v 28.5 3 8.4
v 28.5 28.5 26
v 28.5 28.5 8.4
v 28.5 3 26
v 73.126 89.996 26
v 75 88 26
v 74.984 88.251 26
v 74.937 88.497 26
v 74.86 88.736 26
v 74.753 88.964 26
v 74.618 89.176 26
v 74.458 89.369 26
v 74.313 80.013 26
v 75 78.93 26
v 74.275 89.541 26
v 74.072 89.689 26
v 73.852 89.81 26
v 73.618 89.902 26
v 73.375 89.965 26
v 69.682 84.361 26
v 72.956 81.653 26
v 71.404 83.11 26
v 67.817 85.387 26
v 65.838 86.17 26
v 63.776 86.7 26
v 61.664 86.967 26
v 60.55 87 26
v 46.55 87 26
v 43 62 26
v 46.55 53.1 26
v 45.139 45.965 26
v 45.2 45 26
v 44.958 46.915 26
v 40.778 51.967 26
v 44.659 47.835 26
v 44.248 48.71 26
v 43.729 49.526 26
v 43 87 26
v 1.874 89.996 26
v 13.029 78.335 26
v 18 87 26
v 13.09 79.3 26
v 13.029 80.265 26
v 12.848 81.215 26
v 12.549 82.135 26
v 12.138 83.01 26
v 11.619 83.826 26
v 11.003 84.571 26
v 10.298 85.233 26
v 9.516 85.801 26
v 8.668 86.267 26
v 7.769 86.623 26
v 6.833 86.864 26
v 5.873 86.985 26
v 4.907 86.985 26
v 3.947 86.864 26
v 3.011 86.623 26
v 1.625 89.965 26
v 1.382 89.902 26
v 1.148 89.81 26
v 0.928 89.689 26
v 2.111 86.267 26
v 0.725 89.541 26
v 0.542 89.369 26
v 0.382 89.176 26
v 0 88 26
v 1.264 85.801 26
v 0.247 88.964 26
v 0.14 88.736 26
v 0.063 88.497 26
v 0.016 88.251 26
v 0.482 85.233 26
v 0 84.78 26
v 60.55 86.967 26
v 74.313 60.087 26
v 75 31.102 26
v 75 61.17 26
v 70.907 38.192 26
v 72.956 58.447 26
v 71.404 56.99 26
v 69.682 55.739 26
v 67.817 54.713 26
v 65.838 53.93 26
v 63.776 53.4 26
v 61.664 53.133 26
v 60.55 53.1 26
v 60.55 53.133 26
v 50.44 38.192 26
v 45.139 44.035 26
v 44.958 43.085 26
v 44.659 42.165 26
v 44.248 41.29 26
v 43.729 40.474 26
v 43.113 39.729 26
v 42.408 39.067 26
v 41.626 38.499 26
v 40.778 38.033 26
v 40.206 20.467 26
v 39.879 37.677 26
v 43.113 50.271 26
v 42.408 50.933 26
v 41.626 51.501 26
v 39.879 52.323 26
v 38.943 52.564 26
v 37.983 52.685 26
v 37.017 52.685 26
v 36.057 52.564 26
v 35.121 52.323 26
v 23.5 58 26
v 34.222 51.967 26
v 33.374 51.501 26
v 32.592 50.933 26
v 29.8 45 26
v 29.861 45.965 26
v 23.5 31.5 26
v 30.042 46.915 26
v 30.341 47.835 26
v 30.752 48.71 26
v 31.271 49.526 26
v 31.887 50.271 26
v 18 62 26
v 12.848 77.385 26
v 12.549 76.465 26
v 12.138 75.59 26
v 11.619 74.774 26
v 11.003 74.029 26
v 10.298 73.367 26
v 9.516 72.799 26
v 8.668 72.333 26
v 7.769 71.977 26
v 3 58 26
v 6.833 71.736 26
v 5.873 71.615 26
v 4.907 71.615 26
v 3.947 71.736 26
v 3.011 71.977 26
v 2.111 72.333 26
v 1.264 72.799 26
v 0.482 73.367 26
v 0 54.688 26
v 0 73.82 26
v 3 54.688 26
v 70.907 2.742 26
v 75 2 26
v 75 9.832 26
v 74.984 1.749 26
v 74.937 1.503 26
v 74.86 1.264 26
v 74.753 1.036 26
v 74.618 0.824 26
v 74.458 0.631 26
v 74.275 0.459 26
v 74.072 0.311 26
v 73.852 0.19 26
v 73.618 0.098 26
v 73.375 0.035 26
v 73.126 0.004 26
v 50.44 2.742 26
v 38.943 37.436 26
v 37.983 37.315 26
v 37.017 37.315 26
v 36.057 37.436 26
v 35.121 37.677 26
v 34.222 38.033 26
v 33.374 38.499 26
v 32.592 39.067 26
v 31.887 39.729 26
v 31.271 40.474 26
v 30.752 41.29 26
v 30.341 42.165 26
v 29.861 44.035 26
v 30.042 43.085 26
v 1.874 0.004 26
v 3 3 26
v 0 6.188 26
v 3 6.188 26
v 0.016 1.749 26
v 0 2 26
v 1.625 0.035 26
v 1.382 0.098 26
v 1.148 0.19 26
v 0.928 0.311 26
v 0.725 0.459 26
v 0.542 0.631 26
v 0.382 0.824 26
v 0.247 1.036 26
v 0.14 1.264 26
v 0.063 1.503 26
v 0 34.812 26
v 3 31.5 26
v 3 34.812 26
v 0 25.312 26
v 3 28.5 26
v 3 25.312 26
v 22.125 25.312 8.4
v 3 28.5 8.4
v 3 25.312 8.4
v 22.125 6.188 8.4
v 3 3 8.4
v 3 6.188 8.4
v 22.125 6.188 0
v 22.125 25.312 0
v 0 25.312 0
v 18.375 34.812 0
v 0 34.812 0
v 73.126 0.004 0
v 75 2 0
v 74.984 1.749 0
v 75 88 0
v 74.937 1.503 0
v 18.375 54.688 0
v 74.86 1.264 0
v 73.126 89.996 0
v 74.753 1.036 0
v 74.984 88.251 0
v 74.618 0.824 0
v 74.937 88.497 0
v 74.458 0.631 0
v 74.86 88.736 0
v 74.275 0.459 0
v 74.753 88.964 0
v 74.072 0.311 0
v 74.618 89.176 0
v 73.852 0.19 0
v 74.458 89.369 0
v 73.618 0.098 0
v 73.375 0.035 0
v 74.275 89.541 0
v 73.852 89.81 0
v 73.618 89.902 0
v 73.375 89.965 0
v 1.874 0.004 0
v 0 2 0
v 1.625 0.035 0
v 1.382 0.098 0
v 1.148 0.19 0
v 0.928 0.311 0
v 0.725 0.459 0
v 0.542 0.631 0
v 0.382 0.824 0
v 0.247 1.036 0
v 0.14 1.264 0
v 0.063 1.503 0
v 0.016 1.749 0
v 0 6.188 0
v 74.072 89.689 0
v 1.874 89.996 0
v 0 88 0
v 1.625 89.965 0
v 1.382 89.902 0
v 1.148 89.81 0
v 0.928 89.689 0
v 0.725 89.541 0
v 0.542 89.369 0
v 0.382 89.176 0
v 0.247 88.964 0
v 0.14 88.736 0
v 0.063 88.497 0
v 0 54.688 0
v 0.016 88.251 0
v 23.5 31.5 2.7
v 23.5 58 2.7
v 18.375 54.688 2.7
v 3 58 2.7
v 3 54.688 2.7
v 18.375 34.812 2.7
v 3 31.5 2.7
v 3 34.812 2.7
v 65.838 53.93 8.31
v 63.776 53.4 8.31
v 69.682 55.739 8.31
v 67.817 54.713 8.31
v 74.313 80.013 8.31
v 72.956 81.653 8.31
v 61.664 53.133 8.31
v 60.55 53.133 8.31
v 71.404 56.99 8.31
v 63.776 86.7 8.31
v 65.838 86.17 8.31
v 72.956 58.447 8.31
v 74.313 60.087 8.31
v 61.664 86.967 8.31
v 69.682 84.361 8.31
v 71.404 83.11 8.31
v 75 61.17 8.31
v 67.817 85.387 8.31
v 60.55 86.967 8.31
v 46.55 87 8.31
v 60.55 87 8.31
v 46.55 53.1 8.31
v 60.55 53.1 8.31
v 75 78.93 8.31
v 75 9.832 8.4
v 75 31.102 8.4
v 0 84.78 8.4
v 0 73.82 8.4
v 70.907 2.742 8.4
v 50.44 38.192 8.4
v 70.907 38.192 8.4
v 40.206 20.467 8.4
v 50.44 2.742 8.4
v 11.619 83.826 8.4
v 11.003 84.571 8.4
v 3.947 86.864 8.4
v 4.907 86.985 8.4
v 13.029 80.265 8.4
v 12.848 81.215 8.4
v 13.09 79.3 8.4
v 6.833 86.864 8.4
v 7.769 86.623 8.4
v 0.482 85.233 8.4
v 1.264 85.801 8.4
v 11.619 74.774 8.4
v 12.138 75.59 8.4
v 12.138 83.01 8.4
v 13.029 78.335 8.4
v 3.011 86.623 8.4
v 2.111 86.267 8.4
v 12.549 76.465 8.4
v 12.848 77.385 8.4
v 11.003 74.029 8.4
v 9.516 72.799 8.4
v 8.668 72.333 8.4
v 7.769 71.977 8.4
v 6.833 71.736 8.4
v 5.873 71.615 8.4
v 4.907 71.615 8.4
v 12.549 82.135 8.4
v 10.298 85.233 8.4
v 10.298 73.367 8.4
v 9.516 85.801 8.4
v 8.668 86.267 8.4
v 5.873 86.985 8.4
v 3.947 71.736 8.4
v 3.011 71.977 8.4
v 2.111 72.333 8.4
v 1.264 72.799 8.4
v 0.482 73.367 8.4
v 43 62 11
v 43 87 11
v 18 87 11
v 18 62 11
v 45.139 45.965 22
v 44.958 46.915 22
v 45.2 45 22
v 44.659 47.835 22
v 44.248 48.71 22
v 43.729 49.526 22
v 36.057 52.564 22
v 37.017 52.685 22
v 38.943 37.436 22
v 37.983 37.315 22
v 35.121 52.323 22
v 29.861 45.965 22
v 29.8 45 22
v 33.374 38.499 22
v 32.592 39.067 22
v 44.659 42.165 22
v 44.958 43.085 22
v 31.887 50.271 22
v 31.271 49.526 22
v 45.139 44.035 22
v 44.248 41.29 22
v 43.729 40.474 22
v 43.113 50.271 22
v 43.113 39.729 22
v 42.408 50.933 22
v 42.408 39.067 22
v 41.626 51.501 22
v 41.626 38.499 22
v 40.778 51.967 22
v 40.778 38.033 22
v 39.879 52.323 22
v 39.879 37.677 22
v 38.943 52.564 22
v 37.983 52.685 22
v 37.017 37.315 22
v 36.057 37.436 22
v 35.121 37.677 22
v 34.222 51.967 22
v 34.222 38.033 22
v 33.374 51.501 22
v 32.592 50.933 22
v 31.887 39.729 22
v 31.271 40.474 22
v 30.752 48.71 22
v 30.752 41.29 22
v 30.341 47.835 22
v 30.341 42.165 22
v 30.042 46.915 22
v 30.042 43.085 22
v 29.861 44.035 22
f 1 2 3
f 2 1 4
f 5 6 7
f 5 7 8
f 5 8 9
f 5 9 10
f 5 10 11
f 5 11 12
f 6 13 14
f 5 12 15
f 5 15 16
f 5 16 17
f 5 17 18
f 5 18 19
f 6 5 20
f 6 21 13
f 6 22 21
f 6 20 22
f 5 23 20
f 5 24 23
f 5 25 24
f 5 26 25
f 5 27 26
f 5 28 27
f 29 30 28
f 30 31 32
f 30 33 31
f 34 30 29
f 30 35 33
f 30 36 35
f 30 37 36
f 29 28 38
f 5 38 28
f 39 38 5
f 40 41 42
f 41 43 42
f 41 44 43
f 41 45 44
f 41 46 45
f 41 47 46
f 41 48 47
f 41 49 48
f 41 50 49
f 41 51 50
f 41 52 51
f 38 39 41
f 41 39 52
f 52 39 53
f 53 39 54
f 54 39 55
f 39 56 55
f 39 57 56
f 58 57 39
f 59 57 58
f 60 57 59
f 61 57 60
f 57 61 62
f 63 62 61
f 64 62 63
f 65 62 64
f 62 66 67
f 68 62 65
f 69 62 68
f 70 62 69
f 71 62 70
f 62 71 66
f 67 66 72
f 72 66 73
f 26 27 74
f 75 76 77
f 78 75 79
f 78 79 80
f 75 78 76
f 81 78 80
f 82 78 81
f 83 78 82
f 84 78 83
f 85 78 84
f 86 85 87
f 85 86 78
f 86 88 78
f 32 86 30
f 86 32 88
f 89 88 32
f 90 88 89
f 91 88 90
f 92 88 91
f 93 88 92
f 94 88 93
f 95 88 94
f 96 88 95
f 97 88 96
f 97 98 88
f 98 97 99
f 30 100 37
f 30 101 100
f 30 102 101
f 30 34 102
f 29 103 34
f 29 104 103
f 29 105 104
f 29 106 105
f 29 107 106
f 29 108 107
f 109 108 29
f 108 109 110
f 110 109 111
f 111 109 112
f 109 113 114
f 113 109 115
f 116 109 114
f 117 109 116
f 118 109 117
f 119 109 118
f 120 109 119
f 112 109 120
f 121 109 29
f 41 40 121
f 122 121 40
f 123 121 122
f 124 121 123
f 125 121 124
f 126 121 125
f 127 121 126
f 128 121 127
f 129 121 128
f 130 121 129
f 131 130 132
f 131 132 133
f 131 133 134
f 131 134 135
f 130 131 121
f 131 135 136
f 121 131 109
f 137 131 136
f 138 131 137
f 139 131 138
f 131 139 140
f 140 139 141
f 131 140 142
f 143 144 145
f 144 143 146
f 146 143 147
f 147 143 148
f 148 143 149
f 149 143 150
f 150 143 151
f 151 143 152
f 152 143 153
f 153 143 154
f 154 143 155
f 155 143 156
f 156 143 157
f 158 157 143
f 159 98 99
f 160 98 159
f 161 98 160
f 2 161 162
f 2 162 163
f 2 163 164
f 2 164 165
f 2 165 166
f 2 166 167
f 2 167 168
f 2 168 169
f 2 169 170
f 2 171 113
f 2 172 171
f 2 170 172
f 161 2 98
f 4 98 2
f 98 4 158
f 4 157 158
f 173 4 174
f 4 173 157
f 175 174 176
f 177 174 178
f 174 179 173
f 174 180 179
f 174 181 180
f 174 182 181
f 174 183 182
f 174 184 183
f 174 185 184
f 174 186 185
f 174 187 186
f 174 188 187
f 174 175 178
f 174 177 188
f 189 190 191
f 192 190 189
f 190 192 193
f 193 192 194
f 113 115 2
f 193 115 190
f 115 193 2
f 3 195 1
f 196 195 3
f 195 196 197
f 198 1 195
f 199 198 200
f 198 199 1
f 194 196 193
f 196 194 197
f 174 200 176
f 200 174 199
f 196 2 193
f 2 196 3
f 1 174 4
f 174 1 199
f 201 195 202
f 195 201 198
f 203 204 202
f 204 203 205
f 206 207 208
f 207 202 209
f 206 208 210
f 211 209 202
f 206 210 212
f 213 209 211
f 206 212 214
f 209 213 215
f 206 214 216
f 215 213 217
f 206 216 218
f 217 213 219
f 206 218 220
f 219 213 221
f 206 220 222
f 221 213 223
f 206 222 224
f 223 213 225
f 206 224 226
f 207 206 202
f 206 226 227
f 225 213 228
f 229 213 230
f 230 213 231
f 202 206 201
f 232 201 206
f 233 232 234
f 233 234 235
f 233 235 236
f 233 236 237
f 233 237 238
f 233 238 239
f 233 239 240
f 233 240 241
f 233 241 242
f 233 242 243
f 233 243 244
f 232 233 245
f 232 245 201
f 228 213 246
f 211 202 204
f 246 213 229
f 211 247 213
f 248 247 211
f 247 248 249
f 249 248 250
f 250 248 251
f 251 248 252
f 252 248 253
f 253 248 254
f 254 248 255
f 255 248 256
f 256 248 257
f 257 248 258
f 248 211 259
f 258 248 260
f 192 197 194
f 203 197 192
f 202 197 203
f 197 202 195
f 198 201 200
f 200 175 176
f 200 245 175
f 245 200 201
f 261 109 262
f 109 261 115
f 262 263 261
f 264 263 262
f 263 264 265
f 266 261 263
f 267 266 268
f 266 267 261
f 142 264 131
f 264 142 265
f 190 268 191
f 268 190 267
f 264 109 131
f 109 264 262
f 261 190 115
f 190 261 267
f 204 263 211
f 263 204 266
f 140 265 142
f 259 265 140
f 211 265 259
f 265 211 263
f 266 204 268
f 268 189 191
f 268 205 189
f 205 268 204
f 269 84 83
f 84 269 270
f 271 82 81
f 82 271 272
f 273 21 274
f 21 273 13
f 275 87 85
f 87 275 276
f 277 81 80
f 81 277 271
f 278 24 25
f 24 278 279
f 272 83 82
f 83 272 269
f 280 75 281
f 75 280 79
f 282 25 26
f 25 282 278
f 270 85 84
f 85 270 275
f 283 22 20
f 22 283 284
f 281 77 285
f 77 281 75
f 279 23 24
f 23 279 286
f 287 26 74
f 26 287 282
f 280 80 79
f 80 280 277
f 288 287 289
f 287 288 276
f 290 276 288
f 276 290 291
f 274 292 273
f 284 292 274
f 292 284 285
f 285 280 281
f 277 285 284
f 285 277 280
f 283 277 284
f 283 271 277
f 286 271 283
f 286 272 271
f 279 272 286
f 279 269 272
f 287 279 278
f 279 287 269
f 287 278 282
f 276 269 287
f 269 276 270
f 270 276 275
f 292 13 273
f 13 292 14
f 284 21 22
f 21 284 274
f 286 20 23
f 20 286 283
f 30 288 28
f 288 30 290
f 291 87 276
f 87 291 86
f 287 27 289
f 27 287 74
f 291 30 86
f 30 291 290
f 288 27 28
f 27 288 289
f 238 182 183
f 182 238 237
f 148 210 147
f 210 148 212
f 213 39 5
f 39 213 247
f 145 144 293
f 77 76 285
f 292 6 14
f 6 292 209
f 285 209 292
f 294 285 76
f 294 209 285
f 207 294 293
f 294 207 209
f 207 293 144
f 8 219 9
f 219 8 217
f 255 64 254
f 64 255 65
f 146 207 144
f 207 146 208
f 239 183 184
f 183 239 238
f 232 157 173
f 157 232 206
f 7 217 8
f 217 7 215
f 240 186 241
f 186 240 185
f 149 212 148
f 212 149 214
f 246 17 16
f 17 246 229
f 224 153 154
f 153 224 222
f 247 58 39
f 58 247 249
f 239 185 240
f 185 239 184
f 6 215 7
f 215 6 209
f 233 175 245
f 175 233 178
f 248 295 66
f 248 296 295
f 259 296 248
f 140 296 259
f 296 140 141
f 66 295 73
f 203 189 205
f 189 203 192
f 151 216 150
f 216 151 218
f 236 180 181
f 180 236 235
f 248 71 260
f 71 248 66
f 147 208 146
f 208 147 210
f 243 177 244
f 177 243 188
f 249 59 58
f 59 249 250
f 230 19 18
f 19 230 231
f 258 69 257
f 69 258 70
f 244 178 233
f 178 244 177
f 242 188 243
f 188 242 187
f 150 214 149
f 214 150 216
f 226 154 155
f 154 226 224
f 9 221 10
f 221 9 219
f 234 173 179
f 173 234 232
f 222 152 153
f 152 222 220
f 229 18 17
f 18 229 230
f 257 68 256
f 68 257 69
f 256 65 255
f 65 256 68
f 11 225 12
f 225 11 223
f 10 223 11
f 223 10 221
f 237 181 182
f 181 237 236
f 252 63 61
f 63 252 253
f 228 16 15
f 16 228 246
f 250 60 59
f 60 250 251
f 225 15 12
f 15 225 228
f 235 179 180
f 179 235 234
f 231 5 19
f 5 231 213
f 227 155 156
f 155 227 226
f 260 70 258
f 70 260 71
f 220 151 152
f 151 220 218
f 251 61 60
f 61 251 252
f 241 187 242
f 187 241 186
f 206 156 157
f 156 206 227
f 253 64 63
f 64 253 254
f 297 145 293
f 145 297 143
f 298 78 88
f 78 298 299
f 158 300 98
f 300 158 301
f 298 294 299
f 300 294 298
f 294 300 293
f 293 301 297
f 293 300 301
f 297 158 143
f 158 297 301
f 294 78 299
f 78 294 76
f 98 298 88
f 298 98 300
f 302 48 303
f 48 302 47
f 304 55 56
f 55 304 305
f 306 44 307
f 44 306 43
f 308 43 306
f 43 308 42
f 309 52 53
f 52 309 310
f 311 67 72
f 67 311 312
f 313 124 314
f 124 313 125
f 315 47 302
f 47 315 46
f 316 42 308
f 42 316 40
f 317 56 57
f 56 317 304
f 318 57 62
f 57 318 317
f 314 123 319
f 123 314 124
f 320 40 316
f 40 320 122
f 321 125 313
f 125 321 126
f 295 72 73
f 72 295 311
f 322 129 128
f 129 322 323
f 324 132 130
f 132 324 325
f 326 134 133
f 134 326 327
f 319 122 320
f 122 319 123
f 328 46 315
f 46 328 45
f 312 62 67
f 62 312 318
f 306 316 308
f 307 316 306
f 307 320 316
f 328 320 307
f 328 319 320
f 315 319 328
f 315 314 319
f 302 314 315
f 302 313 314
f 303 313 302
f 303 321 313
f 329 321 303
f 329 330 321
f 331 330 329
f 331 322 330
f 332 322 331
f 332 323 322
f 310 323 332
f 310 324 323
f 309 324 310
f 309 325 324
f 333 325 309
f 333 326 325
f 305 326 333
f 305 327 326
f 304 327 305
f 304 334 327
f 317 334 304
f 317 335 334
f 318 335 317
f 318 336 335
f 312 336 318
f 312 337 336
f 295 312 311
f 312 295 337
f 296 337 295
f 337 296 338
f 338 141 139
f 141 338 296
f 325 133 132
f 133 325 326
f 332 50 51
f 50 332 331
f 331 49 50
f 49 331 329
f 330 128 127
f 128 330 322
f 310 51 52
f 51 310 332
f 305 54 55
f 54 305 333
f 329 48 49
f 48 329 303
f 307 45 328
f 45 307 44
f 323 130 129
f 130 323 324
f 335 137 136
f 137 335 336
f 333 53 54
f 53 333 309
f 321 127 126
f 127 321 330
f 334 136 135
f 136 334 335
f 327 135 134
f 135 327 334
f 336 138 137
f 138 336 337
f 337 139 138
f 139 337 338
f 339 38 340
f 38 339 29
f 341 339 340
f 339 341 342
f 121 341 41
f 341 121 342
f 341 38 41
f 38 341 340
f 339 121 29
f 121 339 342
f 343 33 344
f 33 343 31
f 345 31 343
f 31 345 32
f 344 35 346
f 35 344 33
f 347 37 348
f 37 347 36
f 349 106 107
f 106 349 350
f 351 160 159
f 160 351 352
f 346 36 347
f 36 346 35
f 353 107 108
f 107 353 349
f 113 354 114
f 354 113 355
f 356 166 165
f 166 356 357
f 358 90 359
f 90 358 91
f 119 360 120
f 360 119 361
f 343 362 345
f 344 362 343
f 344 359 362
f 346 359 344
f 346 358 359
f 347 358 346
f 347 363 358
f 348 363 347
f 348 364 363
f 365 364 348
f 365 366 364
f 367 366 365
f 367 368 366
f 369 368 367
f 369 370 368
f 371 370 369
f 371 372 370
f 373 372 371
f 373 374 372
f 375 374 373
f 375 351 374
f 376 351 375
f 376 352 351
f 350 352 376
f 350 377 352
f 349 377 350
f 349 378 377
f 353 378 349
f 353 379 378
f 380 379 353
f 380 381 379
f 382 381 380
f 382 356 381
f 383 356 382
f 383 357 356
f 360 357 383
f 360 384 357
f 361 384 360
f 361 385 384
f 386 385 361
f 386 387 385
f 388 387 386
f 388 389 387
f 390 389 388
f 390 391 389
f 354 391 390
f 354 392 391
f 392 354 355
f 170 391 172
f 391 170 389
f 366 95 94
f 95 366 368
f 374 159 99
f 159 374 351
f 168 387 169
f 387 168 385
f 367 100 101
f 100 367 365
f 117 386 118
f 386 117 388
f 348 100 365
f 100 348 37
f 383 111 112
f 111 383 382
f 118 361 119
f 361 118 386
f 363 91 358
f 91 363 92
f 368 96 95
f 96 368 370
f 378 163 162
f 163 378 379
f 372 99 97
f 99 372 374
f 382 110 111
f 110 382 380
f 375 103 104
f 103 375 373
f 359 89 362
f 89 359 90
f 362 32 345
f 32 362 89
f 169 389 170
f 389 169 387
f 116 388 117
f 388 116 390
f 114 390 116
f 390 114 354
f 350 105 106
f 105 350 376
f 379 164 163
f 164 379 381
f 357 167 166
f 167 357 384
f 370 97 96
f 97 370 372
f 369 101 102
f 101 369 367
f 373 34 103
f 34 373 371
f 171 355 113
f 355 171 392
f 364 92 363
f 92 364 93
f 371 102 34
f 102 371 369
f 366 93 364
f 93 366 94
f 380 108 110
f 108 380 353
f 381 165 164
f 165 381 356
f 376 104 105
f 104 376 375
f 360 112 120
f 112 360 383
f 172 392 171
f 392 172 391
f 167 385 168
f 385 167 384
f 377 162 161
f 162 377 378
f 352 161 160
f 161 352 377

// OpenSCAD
// file: SquareWithCirclePileLib.scad
module LeftPile(
    wallThickness,
    totalHeight,
    singlePileHeight,
    singlePileWidth,
    singlePileSquareLength,
    singlePileCircleLength,
    pileCount,
    openingSizePercent = .75
){
    pileHeight = (pileCount * singlePileHeight) + .5;
    offset = singlePileCircleLength * .15;

    translate([singlePileCircleLength - offset, wallThickness, totalHeight - pileHeight])
        cube([singlePileSquareLength, singlePileWidth, pileHeight]);
    union() {
        intersection(){
            translate([singlePileWidth/2 - offset, wallThickness + singlePileWidth/2, totalHeight - pileHeight])
                cylinder(pileHeight, d=singlePileWidth);
            translate([0, wallThickness, totalHeight - pileHeight])
                cube([singlePileCircleLength, singlePileWidth, pileHeight]);
        }
        intersection(){
            translate([singlePileWidth/2 - offset, wallThickness + singlePileWidth/2, totalHeight - pileHeight])
                cylinder(pileHeight, d=singlePileWidth);
            translate([-wallThickness, wallThickness, totalHeight - pileHeight])
                cube([singlePileCircleLength, singlePileWidth, pileHeight]);
        }
        translate([4, 4, 0])
            rotate([0, 0, 45])
                translate([wallThickness, wallThickness, totalHeight - pileHeight])
                    cube([singlePileCircleLength, singlePileCircleLength, pileHeight]);
    }
}

module RightPile(
    wallThickness,
    totalHeight,
    singlePileHeight,
    singlePileWidth,
    singlePileSquareLength,
    singlePileCircleLength,
    pileCount,
    openingSizePercent = .75
){
    translate([0, wallThickness + wallThickness + singlePileWidth, 0])
        rotate([0, 0, 180])
            LeftPile(
                wallThickness,
                totalHeight,
                singlePileHeight,
                singlePileWidth,
                singlePileSquareLength,
                singlePileCircleLength,
                pileCount,
                openingSizePercent
            );
}

module BottomPile(
    wallThickness,
    totalHeight,
    singlePileHeight,
    singlePileWidth,
    singlePileSquareLength,
    singlePileCircleLength,
    pileCount,
    openingSizePercent = .75
){
    translate([wallThickness + wallThickness + singlePileWidth, 0, 0])
        rotate([0, 0, 90])
            LeftPile(
                wallThickness,
                totalHeight,
                singlePileHeight,
                singlePileWidth,
                singlePileSquareLength,
                singlePileCircleLength,
                pileCount,
                openingSizePercent
            );
}

module TopPile(
    wallThickness,
    totalHeight,
    singlePileHeight,
    singlePileWidth,
    singlePileSquareLength,
    singlePileCircleLength,
    pileCount,
    openingSizePercent = .75
){
        rotate([0, 0, 270])
            LeftPile(
                wallThickness,
                totalHeight,
                singlePileHeight,
                singlePileWidth,
                singlePileSquareLength,
                singlePileCircleLength,
                pileCount,
                openingSizePercent
            );
}
// file: HexPileLib.scad
module LeftPile(totalHeight, singlePileHeight, singlePileDiameter, pileCount){
    pileHeight = (pileCount * singlePileHeight) + .5;
    offset = singlePileDiameter * .15;
    translate([singlePileDiameter/2 - offset, singlePileDiameter/2, totalHeight - pileHeight])
        cylinder(pileHeight, d=singlePileDiameter, $fn=6);
}

module RightPile(totalHeight, singlePileHeight, singlePileDiameter, pileCount){
    translate([0, singlePileDiameter, 0])
        rotate([0, 0, 180])
            LeftPile(totalHeight, singlePileHeight, singlePileDiameter, pileCount);
}

module BottomPile(totalHeight, singlePileHeight, singlePileDiameter, pileCount){
    translate([singlePileDiameter, 0, 0])
        rotate([0, 0, 90])
            LeftPile(totalHeight, singlePileHeight, singlePileDiameter, pileCount);
}

module TopPile(totalHeight, singlePileHeight, singlePileDiameter, pileCount){
        rotate([0, 0, 270])
            LeftPile(totalHeight, singlePileHeight, singlePileDiameter, pileCount);
}
// file: CaledoniaPointTileLib.scad
include<SquareWithCirclePileLib.scad>
singlePointTileHeight = 1.91;
singlePointTileWidth = 32.9 + 1;
singlePointTileSquareLength = 13 + 1;
singlePointTileCircleLength = 16 + 1;

module LeftPointTile(wallThickness, totalHeight, pointTileCount){
    LeftPile(
        wallThickness,
        totalHeight,
        singlePointTileHeight,
        singlePointTileWidth,
        singlePointTileSquareLength,
        singlePointTileCircleLength,
        pointTileCount);
}

module RightPointTile(wallThickness, totalHeight, pointTileCount){
    RightPile(
        wallThickness,
        totalHeight,
        singlePointTileHeight,
        singlePointTileWidth,
        singlePointTileSquareLength,
        singlePointTileCircleLength,
        pointTileCount);
}

module BottomPointTile(wallThickness, totalHeight, pointTileCount){
    BottomPile(
        wallThickness,
        totalHeight,
        singlePointTileHeight,
        singlePointTileWidth,
        singlePointTileSquareLength,
        singlePointTileCircleLength,
        pointTileCount);
}

module TopPointTile(wallThickness, totalHeight, pointTileCount){
    TopPile(
        wallThickness,
        totalHeight,
        singlePointTileHeight,
        singlePointTileWidth,
        singlePointTileSquareLength,
        singlePointTileCircleLength,
        pointTileCount);
}

function pointTileHeight(pointTileCount) =
    (pointTileCount * singlePointTileHeight) + .5;
// file: CirclePileLib.scad
module LeftPile(totalHeight, singlePileHeight, singlePileDiameter, pileCount){
    pileHeight = (pileCount * singlePileHeight) + .5;
    offset = singlePileDiameter * .15;
    translate([singlePileDiameter/2 - offset, singlePileDiameter/2, totalHeight - pileHeight])
        cylinder(pileHeight, d=singlePileDiameter);
}

module RightPile(totalHeight, singlePileHeight, singlePileDiameter, pileCount){
    translate([0, singlePileDiameter, 0])
        rotate([0, 0, 180])
            LeftPile(totalHeight, singlePileHeight, singlePileDiameter, pileCount);
}

module BottomPile(totalHeight, singlePileHeight, singlePileDiameter, pileCount){
    translate([singlePileDiameter, 0, 0])
        rotate([0, 0, 90])
            LeftPile(totalHeight, singlePileHeight, singlePileDiameter, pileCount);
}

module TopPile(totalHeight, singlePileHeight, singlePileDiameter, pileCount){
        rotate([0, 0, 270])
            LeftPile(totalHeight, singlePileHeight, singlePileDiameter, pileCount);
}
// file: CaledoniaPortsLib.scad
include<HexPileLib.scad>
singlePortHeight = 1.9;
//flat to flat = d = 34.65;
//D = d * 2/rt(3)
d = 34.65 + .8;
D = d * 2/sqrt(3);
singlePortDiameter = D;
//singlePortDiameter =  + .5;

module LeftPort(totalHeight, portCount){
    LeftPile(
        totalHeight,
        singlePortHeight,
        singlePortDiameter,
        portCount);
}

module RightPort(totalHeight, portCount){
    RightPile(
        totalHeight,
        singlePortHeight,
        singlePortDiameter,
        portCount);
}

module BottomPort(totalHeight, portCount){
    BottomPile(
        totalHeight,
        singlePortHeight,
        singlePortDiameter,
        portCount);
}

module TopPort(totalHeight, portCount){
    TopPile(
        totalHeight,
        singlePortHeight,
        singlePortDiameter,
        portCount);
}

function portHeight(portCount) =
    (portCount * singlePortHeight) + .5;

function actualPortWidth() = singlePortDiameter * .85;
// file: SquarePileLib.scad
module LeftPile(wallThickness, totalHeight, singlePileHeight, singlePileWidth, singlePileLength, pileCount, openingSizePercent = .75){
    pileHeight = (pileCount * singlePileHeight) + .5;
    lengthOpeningSize = singlePileLength * openingSizePercent;
    widthOpeningSize = singlePileWidth * openingSizePercent;
    blockerSize = (singlePileWidth - widthOpeningSize) / 2;
    
    translate([wallThickness, wallThickness, totalHeight - pileHeight])
        cube([singlePileLength, singlePileWidth, pileHeight]);
    translate([-.00001, wallThickness + (blockerSize), 0])
        cube([wallThickness + lengthOpeningSize, widthOpeningSize, totalHeight]);
}

module RightPile(wallThickness, totalHeight, singlePileHeight, singlePileWidth, singlePileLength, pileCount, openingSizePercent = .75){
    translate([0, wallThickness + wallThickness + singlePileWidth, 0])
        rotate([0, 0, 180])
            LeftPile(wallThickness, totalHeight, singlePileHeight, singlePileWidth, singlePileLength, pileCount, openingSizePercent);
}

module BottomPile(wallThickness, totalHeight, singlePileHeight, singlePileWidth, singlePileLength, pileCount, openingSizePercent = .75){
    translate([wallThickness + wallThickness + singlePileWidth, 0, 0])
        rotate([0, 0, 90])
            LeftPile(wallThickness, totalHeight, singlePileHeight, singlePileWidth, singlePileLength, pileCount, openingSizePercent);
}

module TopPile(wallThickness, totalHeight, singlePileHeight, singlePileWidth, singlePileLength, pileCount, openingSizePercent = .75){
        rotate([0, 0, 270])
            LeftPile(wallThickness, totalHeight, singlePileHeight, singlePileWidth, singlePileLength, pileCount, openingSizePercent);
}
// main file
magnetBaseInnerDiameter = 15.4;
magnetHeight = 4.0;
floorThickness = 2;
wallThickness = 3;
height = 26;
length = 75;
width = 90;
multiplierTileHeight = 1.9;
multiplierTileWidth = 26 + .5;
multiplierTileLength = 20 + .5;
multiplierTileCount = 12;
startingBonusTileHeight = 1.9;
startingBonusTileWidth = 25 + .5;
startingBonusTileLength = 25 + .5;
startingBonusTileCount = 9;
marketMarkerDiameter = 14.9 + .5;
marketMarkerHeight = 2.85;
marketMarkerCount = 6;
portCount = 9;
goodsBoxLength = 25;
goodsBoxWidth = 25;
goodsBoxHeight = 15;

difference() {

//    whitespace between boxes = (total length - (# of boxes * width of boxes)) / (# of boxes + 1)
//    position of box n = whitespace * n + 1 + width of box * (n)
    
    $fn=50;
    minkowski()
    {
      translate([2,2,0])
        cube([length-4, width-4, height - 1]);
      cylinder(r=2,h=1);
    }
    
    SquarePiles();
    
    
        
    
    Ports();
    
    MarketMarkers();
    
    PointTiles();
    
    translate([length / 2 - goodsBoxLength/2 - 7, width - (goodsBoxLength + wallThickness), height - goodsBoxHeight])
        cube([goodsBoxLength, goodsBoxWidth, goodsBoxHeight]);
    
    translate([length/2,  width/2, height - magnetHeight])
        cylinder(magnetHeight, d=magnetBaseInnerDiameter);
        
    
 
    

}

module SquarePiles()
{
    include<SquarePileLib.scad>;
    LeftPile(
        wallThickness,
        height,
        startingBonusTileHeight,
        startingBonusTileWidth,
        startingBonusTileLength,
        startingBonusTileCount);
   
    
    translate([0, wallThickness + startingBonusTileWidth, 0])
        LeftPile(
            wallThickness,
            height,
            multiplierTileHeight,
            multiplierTileWidth,
            multiplierTileLength,
            multiplierTileCount);
}

module Ports()
{
    include<CaledoniaPortsLib.scad>;
     translate([length, 0, 0])
        RightPort(height, portCount);
}

module MarketMarkers()
{
    include<CirclePileLib.scad>;
    translate([0, width - (wallThickness + marketMarkerDiameter), 0])
        LeftPile(height, marketMarkerHeight, marketMarkerDiameter, marketMarkerCount);

}

module PointTiles()
{
    include<CaledoniaPointTileLib.scad>;
    translate([length, width - (wallThickness * 2 + singlePointTileWidth), 0])
        RightPointTile(wallThickness, height, 9);
}
